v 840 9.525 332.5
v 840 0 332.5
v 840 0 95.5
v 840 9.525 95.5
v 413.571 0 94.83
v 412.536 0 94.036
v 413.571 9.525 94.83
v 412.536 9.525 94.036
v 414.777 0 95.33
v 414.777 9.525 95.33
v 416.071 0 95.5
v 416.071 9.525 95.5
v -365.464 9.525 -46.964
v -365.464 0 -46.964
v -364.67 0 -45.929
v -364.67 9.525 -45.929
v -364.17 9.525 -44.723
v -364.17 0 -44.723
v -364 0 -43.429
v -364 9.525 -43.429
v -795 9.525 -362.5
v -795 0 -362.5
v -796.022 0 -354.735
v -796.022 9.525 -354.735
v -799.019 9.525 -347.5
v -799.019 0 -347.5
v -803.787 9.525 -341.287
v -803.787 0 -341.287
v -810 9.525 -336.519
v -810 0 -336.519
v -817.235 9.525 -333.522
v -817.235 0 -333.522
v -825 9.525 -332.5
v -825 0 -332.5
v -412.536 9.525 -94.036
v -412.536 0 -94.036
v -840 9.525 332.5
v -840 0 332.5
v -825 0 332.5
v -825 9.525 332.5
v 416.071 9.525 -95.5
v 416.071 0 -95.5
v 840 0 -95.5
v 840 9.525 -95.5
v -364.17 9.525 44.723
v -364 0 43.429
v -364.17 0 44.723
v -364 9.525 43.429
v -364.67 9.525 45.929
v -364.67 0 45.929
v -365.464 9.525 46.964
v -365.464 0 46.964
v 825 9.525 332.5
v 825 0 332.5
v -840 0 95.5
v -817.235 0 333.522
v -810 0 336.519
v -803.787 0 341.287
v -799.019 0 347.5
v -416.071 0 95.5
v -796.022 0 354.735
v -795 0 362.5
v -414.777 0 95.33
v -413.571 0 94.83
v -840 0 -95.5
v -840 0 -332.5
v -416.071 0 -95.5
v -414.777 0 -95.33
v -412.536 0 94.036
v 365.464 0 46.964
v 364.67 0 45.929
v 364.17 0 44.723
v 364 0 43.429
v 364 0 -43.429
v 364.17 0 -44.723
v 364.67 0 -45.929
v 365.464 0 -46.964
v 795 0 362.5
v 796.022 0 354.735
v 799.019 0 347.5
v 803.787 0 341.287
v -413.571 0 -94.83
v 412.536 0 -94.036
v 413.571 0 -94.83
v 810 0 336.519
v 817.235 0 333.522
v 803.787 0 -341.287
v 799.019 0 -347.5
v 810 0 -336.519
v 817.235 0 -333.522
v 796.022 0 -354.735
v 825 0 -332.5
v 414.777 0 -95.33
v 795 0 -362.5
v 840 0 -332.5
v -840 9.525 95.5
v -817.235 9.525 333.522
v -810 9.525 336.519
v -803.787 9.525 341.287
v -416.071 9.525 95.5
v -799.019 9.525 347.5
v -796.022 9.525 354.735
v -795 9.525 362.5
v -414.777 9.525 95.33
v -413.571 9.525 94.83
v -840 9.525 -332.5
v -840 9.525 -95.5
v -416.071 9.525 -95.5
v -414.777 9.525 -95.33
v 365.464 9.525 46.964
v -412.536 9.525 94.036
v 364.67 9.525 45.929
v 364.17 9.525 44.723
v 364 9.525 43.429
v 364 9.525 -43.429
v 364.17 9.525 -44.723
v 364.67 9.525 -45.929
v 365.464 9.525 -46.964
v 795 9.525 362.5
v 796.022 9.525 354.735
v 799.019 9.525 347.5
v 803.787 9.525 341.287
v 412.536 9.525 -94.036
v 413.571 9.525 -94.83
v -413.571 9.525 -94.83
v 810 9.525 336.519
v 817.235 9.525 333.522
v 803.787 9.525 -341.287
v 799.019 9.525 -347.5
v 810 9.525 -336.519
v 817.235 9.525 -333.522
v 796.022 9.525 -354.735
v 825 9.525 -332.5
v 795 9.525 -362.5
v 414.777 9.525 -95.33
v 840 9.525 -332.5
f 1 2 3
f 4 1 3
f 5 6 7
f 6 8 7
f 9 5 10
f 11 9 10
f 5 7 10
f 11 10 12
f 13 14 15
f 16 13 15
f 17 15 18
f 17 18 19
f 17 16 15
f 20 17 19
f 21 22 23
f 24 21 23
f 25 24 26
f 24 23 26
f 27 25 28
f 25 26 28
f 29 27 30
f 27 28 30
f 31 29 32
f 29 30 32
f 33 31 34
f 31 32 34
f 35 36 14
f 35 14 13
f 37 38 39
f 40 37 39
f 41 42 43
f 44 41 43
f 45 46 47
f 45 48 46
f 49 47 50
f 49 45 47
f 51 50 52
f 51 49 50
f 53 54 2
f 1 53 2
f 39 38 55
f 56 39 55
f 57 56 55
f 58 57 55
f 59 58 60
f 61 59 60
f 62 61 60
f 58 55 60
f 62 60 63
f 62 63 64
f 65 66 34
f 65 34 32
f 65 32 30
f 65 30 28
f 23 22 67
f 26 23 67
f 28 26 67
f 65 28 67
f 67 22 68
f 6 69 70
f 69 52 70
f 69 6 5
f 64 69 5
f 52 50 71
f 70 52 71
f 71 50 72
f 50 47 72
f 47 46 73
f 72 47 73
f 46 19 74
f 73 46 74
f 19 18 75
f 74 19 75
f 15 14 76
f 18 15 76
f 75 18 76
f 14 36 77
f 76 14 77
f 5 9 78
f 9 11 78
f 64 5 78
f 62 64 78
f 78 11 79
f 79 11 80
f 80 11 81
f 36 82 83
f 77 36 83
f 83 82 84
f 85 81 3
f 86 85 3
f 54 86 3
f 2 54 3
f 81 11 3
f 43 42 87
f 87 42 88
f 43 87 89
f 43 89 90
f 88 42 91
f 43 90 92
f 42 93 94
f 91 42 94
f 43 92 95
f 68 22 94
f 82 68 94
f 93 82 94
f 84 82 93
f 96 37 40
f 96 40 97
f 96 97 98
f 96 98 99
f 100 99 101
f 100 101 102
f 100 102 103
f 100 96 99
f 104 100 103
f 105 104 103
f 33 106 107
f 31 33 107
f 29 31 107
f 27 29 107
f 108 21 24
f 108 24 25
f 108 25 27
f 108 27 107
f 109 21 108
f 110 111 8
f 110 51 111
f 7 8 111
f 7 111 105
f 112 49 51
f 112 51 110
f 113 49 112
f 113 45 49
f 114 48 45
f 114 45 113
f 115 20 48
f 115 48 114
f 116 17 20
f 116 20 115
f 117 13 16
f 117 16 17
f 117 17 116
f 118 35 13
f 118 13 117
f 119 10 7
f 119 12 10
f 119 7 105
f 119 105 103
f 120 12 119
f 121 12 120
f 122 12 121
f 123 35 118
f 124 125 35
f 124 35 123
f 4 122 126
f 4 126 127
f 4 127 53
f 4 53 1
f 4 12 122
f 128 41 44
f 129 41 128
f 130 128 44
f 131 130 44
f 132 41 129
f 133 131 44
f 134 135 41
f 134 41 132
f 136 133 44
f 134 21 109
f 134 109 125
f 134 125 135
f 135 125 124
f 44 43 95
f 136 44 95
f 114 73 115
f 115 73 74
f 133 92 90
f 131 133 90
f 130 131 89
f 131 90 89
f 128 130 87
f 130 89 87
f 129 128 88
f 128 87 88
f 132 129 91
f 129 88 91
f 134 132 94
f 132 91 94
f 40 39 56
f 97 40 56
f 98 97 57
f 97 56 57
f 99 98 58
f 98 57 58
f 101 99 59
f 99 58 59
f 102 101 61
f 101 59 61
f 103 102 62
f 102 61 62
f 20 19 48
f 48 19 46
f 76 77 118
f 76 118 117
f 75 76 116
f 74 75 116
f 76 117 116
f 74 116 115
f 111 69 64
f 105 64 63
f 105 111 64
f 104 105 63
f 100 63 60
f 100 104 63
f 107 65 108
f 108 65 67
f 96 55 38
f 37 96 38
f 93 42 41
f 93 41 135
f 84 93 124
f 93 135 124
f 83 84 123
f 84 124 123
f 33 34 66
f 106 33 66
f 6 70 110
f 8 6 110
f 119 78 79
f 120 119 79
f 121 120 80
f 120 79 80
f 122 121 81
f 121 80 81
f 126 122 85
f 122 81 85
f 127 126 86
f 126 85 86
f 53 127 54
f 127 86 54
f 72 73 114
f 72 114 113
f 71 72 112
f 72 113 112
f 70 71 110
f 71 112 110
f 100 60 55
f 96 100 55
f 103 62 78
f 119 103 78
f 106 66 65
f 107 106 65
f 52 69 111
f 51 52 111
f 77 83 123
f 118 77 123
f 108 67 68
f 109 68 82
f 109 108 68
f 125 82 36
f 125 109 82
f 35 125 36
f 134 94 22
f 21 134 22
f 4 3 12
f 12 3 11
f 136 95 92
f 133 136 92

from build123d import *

# Parameters (mm, degrees)
BOSS_EXTRUDE1_DEPTH = 9.525
CHAMFER1_SIZE       = 50
FILLET2_R           = 5


with BuildPart() as part:
    # Sketch1 → Boss-Extrude1 (new body)
    with BuildSketch(Plane(origin=(0, 0, 0), x_dir=(1, 0, 0), z_dir=(0, 1, 0))):
        with BuildLine():
            Line((-840, 332.5), (-840, 95.5))
            Line((-840, 95.5), (-364, 95.5))
            Line((-364, 95.5), (-364, -95.5))
            Line((-364, -95.5), (-840, -95.5))
            Line((-840, -95.5), (-840, -332.5))
            Line((-840, -332.5), (-825, -332.5))
            ThreePointArc((-825, -332.5), (-803.786796564, -341.286796564), (-795, -362.5))
            Line((-795, -362.5), (795, -362.5))
            ThreePointArc((795, -362.5), (803.786796564, -341.286796564), (825, -332.5))
            Line((825, -332.5), (840, -332.5))
            Line((840, -332.5), (840, -95.5))
            Line((840, -95.5), (364, -95.5))
            Line((364, -95.5), (364, 95.5))
            Line((364, 95.5), (840, 95.5))
            Line((840, 95.5), (840, 332.5))
            Line((840, 332.5), (825, 332.5))
            ThreePointArc((825, 332.5), (803.786796564, 341.286796564), (795, 362.5))
            Line((795, 362.5), (-795, 362.5))
            ThreePointArc((-795, 362.5), (-803.786796564, 341.286796564), (-825, 332.5))
            Line((-825, 332.5), (-840, 332.5))
        make_face()
    extrude(amount=BOSS_EXTRUDE1_DEPTH)

    # Chamfer1
    chamfer1_edges = [part.edges().sort_by_distance(p)[0] for p in [
        (-364, 4.7625, 95.5),
        (-364, 4.7625, -95.5),
        (364, 4.7625, -95.5),
        (364, 4.7625, 95.5),
    ]]
    chamfer(chamfer1_edges, length=CHAMFER1_SIZE)

    # Fillet2
    fillet2_edges = [part.edges().sort_by_distance(p)[0] for p in [
        (364, 4.7625, -45.5),
        (364, 4.7625, 45.5),
        (414, 4.7625, 95.5),
        (414, 4.7625, -95.5),
        (-414, 4.7625, 95.5),
        (-364, 4.7625, -45.5),
        (-364, 4.7625, 45.5),
        (-414, 4.7625, -95.5),
    ]]
    fillet(fillet2_edges, radius=FILLET2_R)


solid = part.part
